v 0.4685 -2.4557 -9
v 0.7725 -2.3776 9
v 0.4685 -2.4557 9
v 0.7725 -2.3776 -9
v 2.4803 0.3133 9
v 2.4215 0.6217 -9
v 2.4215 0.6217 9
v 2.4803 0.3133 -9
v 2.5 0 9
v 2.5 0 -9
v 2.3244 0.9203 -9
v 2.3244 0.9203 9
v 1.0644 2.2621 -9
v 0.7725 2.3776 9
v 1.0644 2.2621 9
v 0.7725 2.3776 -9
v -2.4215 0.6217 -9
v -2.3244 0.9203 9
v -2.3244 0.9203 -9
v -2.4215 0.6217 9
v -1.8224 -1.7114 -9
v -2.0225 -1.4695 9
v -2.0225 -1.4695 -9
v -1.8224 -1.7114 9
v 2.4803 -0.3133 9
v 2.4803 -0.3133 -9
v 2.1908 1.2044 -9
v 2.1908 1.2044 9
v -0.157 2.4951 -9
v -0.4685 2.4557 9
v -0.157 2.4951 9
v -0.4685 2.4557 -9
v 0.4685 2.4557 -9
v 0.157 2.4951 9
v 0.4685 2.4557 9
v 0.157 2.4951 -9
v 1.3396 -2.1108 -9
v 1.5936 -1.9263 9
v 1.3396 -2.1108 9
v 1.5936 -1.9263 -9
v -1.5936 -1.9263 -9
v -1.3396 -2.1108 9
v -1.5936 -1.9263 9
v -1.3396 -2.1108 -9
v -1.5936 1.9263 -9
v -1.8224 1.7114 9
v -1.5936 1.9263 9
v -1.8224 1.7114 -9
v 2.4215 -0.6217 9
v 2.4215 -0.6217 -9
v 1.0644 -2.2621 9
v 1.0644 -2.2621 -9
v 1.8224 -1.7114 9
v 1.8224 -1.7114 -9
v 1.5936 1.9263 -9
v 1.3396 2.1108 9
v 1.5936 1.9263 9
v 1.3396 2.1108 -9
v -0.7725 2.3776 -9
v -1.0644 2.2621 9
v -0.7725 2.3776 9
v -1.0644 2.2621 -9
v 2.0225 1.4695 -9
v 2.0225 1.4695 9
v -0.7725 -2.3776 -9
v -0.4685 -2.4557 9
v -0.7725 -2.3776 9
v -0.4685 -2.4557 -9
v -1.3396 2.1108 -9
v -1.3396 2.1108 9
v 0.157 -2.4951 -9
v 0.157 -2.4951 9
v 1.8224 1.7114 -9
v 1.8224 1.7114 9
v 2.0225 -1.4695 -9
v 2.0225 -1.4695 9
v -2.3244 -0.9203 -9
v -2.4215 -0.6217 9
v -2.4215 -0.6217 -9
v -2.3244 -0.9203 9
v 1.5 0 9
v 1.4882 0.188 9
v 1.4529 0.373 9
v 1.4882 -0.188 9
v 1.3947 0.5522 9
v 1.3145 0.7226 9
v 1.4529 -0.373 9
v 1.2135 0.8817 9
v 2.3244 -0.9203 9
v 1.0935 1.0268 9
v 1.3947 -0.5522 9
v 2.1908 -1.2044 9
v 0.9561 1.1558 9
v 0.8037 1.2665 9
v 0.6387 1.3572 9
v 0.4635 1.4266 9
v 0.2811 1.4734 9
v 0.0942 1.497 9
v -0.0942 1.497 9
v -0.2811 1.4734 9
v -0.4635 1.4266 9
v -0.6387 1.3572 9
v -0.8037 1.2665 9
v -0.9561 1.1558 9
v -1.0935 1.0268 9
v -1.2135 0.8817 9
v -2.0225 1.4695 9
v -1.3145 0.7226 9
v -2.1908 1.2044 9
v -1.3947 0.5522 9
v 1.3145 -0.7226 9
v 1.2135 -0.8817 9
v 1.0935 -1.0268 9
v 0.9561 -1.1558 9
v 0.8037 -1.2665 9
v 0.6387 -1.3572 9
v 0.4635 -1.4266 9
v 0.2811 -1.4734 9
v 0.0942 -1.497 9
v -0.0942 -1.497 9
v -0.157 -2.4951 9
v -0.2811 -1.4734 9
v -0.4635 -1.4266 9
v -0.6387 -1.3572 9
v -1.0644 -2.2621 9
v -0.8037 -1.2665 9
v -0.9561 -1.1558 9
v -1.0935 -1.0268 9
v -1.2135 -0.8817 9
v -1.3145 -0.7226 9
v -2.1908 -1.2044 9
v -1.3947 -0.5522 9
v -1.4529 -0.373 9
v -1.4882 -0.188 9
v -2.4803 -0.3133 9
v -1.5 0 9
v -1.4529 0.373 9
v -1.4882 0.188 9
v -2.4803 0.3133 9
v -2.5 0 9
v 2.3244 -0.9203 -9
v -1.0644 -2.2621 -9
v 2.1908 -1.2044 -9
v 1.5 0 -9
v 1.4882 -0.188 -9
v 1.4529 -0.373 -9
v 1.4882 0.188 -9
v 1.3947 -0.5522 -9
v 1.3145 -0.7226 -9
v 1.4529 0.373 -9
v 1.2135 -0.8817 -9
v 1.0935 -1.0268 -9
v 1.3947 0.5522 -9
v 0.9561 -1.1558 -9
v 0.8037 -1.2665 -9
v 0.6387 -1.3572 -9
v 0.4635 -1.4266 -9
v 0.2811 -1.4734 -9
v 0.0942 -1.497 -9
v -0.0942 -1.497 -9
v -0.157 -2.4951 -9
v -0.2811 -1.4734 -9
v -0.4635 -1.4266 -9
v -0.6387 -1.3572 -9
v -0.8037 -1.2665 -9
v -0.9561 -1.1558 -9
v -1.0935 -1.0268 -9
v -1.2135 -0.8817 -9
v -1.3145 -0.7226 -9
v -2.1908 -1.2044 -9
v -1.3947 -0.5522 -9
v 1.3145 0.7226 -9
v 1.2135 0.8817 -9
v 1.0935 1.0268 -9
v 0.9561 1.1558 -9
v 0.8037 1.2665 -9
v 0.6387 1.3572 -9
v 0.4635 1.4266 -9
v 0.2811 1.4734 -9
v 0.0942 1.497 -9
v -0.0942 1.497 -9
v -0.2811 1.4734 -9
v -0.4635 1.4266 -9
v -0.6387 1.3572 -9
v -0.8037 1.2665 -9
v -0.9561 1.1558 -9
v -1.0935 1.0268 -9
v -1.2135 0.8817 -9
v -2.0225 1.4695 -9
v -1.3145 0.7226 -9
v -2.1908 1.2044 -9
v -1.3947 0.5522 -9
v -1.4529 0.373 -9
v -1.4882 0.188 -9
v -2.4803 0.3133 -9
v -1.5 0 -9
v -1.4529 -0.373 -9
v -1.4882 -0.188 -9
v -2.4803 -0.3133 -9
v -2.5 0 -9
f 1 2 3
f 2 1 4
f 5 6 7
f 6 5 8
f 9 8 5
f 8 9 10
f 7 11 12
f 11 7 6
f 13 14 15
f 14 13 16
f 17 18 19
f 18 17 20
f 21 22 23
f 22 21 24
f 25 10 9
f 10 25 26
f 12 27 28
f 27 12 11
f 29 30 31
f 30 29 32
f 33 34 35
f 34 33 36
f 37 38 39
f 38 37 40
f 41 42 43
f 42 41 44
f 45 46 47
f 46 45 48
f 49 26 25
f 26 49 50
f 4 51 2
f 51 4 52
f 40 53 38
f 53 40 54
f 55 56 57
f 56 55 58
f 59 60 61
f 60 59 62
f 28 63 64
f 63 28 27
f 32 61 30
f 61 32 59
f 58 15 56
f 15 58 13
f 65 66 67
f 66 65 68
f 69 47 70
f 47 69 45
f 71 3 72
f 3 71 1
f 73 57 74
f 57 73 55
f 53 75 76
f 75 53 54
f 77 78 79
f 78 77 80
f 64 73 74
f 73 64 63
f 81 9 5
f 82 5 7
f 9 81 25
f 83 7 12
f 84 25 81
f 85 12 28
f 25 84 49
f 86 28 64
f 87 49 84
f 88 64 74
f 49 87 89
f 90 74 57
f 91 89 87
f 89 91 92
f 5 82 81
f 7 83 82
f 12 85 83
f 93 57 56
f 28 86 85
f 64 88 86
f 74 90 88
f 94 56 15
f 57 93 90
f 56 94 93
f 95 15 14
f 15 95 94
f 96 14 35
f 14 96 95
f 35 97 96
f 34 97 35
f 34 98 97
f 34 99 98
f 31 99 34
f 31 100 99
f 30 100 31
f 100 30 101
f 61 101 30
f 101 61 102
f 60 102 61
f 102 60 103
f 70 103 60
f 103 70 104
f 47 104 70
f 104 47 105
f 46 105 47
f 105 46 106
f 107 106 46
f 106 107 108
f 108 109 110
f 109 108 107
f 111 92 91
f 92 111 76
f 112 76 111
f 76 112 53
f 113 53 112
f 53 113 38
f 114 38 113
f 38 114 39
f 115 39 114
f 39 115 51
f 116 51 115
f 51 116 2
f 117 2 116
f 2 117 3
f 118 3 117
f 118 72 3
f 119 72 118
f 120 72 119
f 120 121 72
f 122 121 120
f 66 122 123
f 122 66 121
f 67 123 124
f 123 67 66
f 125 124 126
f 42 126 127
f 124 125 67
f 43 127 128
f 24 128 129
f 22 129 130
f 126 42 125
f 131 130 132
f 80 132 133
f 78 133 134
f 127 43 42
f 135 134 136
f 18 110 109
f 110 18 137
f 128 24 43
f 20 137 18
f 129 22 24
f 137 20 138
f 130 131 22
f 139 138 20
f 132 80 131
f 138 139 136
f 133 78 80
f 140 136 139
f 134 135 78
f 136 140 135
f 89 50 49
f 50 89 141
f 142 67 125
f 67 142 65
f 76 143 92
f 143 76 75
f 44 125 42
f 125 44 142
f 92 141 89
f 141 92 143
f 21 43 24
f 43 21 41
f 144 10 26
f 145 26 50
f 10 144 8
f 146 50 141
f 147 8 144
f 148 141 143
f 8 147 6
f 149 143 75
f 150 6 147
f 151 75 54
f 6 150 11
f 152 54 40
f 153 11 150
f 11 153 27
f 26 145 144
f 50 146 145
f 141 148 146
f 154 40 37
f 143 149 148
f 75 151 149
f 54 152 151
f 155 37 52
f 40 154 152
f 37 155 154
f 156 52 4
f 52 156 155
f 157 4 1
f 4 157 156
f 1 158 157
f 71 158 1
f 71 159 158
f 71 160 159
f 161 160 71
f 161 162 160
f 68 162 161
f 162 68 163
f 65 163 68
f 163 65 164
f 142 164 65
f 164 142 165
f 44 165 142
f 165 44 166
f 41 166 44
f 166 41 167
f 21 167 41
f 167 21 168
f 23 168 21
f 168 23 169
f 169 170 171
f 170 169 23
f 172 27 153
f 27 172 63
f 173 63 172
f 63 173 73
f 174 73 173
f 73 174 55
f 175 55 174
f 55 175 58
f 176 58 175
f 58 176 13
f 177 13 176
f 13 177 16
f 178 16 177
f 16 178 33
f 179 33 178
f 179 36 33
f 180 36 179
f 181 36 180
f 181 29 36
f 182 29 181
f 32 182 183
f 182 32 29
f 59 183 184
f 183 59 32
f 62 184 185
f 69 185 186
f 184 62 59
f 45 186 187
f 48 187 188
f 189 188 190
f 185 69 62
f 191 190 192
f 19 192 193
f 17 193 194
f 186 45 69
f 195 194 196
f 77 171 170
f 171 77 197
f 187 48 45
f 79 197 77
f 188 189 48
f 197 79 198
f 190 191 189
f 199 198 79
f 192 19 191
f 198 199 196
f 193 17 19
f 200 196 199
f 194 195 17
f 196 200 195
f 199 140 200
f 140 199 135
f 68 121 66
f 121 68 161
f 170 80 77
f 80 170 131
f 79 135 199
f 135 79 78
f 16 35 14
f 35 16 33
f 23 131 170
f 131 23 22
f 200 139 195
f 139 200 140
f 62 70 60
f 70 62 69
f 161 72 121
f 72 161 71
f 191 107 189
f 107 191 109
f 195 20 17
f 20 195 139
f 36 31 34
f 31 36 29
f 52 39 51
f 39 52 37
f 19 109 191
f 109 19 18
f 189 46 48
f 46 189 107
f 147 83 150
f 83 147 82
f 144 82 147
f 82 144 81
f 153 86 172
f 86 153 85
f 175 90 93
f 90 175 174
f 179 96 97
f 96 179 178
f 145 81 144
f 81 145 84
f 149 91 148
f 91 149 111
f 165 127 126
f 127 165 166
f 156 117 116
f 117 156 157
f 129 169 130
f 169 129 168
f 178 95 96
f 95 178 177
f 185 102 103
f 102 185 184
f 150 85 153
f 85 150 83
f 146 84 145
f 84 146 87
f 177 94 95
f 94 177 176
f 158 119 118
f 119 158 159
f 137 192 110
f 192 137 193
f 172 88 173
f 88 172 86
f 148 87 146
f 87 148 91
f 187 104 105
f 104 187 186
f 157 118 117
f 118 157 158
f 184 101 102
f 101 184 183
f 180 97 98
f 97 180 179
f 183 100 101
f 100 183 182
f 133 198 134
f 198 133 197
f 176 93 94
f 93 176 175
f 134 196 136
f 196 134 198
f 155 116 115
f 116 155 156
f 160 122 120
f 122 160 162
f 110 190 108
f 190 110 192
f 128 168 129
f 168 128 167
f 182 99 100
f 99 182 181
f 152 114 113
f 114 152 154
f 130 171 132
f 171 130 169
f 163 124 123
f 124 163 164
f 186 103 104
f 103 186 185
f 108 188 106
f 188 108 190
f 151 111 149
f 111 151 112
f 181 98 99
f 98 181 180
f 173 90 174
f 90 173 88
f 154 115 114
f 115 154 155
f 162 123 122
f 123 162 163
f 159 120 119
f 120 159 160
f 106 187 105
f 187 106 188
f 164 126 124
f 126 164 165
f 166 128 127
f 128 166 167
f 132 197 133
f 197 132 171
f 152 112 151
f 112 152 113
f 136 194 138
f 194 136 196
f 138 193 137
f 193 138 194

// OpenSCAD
$fn = 50;


difference() {
	union() {
		translate(v = [0, 0, -9.0000000000]) {
			cylinder(h = 18, r = 2.5000000000);
		}
	}
	union() {
		translate(v = [0, 0, -100.0000000000]) {
			cylinder(h = 200, r = 1.5000000000);
		}
	}
}
